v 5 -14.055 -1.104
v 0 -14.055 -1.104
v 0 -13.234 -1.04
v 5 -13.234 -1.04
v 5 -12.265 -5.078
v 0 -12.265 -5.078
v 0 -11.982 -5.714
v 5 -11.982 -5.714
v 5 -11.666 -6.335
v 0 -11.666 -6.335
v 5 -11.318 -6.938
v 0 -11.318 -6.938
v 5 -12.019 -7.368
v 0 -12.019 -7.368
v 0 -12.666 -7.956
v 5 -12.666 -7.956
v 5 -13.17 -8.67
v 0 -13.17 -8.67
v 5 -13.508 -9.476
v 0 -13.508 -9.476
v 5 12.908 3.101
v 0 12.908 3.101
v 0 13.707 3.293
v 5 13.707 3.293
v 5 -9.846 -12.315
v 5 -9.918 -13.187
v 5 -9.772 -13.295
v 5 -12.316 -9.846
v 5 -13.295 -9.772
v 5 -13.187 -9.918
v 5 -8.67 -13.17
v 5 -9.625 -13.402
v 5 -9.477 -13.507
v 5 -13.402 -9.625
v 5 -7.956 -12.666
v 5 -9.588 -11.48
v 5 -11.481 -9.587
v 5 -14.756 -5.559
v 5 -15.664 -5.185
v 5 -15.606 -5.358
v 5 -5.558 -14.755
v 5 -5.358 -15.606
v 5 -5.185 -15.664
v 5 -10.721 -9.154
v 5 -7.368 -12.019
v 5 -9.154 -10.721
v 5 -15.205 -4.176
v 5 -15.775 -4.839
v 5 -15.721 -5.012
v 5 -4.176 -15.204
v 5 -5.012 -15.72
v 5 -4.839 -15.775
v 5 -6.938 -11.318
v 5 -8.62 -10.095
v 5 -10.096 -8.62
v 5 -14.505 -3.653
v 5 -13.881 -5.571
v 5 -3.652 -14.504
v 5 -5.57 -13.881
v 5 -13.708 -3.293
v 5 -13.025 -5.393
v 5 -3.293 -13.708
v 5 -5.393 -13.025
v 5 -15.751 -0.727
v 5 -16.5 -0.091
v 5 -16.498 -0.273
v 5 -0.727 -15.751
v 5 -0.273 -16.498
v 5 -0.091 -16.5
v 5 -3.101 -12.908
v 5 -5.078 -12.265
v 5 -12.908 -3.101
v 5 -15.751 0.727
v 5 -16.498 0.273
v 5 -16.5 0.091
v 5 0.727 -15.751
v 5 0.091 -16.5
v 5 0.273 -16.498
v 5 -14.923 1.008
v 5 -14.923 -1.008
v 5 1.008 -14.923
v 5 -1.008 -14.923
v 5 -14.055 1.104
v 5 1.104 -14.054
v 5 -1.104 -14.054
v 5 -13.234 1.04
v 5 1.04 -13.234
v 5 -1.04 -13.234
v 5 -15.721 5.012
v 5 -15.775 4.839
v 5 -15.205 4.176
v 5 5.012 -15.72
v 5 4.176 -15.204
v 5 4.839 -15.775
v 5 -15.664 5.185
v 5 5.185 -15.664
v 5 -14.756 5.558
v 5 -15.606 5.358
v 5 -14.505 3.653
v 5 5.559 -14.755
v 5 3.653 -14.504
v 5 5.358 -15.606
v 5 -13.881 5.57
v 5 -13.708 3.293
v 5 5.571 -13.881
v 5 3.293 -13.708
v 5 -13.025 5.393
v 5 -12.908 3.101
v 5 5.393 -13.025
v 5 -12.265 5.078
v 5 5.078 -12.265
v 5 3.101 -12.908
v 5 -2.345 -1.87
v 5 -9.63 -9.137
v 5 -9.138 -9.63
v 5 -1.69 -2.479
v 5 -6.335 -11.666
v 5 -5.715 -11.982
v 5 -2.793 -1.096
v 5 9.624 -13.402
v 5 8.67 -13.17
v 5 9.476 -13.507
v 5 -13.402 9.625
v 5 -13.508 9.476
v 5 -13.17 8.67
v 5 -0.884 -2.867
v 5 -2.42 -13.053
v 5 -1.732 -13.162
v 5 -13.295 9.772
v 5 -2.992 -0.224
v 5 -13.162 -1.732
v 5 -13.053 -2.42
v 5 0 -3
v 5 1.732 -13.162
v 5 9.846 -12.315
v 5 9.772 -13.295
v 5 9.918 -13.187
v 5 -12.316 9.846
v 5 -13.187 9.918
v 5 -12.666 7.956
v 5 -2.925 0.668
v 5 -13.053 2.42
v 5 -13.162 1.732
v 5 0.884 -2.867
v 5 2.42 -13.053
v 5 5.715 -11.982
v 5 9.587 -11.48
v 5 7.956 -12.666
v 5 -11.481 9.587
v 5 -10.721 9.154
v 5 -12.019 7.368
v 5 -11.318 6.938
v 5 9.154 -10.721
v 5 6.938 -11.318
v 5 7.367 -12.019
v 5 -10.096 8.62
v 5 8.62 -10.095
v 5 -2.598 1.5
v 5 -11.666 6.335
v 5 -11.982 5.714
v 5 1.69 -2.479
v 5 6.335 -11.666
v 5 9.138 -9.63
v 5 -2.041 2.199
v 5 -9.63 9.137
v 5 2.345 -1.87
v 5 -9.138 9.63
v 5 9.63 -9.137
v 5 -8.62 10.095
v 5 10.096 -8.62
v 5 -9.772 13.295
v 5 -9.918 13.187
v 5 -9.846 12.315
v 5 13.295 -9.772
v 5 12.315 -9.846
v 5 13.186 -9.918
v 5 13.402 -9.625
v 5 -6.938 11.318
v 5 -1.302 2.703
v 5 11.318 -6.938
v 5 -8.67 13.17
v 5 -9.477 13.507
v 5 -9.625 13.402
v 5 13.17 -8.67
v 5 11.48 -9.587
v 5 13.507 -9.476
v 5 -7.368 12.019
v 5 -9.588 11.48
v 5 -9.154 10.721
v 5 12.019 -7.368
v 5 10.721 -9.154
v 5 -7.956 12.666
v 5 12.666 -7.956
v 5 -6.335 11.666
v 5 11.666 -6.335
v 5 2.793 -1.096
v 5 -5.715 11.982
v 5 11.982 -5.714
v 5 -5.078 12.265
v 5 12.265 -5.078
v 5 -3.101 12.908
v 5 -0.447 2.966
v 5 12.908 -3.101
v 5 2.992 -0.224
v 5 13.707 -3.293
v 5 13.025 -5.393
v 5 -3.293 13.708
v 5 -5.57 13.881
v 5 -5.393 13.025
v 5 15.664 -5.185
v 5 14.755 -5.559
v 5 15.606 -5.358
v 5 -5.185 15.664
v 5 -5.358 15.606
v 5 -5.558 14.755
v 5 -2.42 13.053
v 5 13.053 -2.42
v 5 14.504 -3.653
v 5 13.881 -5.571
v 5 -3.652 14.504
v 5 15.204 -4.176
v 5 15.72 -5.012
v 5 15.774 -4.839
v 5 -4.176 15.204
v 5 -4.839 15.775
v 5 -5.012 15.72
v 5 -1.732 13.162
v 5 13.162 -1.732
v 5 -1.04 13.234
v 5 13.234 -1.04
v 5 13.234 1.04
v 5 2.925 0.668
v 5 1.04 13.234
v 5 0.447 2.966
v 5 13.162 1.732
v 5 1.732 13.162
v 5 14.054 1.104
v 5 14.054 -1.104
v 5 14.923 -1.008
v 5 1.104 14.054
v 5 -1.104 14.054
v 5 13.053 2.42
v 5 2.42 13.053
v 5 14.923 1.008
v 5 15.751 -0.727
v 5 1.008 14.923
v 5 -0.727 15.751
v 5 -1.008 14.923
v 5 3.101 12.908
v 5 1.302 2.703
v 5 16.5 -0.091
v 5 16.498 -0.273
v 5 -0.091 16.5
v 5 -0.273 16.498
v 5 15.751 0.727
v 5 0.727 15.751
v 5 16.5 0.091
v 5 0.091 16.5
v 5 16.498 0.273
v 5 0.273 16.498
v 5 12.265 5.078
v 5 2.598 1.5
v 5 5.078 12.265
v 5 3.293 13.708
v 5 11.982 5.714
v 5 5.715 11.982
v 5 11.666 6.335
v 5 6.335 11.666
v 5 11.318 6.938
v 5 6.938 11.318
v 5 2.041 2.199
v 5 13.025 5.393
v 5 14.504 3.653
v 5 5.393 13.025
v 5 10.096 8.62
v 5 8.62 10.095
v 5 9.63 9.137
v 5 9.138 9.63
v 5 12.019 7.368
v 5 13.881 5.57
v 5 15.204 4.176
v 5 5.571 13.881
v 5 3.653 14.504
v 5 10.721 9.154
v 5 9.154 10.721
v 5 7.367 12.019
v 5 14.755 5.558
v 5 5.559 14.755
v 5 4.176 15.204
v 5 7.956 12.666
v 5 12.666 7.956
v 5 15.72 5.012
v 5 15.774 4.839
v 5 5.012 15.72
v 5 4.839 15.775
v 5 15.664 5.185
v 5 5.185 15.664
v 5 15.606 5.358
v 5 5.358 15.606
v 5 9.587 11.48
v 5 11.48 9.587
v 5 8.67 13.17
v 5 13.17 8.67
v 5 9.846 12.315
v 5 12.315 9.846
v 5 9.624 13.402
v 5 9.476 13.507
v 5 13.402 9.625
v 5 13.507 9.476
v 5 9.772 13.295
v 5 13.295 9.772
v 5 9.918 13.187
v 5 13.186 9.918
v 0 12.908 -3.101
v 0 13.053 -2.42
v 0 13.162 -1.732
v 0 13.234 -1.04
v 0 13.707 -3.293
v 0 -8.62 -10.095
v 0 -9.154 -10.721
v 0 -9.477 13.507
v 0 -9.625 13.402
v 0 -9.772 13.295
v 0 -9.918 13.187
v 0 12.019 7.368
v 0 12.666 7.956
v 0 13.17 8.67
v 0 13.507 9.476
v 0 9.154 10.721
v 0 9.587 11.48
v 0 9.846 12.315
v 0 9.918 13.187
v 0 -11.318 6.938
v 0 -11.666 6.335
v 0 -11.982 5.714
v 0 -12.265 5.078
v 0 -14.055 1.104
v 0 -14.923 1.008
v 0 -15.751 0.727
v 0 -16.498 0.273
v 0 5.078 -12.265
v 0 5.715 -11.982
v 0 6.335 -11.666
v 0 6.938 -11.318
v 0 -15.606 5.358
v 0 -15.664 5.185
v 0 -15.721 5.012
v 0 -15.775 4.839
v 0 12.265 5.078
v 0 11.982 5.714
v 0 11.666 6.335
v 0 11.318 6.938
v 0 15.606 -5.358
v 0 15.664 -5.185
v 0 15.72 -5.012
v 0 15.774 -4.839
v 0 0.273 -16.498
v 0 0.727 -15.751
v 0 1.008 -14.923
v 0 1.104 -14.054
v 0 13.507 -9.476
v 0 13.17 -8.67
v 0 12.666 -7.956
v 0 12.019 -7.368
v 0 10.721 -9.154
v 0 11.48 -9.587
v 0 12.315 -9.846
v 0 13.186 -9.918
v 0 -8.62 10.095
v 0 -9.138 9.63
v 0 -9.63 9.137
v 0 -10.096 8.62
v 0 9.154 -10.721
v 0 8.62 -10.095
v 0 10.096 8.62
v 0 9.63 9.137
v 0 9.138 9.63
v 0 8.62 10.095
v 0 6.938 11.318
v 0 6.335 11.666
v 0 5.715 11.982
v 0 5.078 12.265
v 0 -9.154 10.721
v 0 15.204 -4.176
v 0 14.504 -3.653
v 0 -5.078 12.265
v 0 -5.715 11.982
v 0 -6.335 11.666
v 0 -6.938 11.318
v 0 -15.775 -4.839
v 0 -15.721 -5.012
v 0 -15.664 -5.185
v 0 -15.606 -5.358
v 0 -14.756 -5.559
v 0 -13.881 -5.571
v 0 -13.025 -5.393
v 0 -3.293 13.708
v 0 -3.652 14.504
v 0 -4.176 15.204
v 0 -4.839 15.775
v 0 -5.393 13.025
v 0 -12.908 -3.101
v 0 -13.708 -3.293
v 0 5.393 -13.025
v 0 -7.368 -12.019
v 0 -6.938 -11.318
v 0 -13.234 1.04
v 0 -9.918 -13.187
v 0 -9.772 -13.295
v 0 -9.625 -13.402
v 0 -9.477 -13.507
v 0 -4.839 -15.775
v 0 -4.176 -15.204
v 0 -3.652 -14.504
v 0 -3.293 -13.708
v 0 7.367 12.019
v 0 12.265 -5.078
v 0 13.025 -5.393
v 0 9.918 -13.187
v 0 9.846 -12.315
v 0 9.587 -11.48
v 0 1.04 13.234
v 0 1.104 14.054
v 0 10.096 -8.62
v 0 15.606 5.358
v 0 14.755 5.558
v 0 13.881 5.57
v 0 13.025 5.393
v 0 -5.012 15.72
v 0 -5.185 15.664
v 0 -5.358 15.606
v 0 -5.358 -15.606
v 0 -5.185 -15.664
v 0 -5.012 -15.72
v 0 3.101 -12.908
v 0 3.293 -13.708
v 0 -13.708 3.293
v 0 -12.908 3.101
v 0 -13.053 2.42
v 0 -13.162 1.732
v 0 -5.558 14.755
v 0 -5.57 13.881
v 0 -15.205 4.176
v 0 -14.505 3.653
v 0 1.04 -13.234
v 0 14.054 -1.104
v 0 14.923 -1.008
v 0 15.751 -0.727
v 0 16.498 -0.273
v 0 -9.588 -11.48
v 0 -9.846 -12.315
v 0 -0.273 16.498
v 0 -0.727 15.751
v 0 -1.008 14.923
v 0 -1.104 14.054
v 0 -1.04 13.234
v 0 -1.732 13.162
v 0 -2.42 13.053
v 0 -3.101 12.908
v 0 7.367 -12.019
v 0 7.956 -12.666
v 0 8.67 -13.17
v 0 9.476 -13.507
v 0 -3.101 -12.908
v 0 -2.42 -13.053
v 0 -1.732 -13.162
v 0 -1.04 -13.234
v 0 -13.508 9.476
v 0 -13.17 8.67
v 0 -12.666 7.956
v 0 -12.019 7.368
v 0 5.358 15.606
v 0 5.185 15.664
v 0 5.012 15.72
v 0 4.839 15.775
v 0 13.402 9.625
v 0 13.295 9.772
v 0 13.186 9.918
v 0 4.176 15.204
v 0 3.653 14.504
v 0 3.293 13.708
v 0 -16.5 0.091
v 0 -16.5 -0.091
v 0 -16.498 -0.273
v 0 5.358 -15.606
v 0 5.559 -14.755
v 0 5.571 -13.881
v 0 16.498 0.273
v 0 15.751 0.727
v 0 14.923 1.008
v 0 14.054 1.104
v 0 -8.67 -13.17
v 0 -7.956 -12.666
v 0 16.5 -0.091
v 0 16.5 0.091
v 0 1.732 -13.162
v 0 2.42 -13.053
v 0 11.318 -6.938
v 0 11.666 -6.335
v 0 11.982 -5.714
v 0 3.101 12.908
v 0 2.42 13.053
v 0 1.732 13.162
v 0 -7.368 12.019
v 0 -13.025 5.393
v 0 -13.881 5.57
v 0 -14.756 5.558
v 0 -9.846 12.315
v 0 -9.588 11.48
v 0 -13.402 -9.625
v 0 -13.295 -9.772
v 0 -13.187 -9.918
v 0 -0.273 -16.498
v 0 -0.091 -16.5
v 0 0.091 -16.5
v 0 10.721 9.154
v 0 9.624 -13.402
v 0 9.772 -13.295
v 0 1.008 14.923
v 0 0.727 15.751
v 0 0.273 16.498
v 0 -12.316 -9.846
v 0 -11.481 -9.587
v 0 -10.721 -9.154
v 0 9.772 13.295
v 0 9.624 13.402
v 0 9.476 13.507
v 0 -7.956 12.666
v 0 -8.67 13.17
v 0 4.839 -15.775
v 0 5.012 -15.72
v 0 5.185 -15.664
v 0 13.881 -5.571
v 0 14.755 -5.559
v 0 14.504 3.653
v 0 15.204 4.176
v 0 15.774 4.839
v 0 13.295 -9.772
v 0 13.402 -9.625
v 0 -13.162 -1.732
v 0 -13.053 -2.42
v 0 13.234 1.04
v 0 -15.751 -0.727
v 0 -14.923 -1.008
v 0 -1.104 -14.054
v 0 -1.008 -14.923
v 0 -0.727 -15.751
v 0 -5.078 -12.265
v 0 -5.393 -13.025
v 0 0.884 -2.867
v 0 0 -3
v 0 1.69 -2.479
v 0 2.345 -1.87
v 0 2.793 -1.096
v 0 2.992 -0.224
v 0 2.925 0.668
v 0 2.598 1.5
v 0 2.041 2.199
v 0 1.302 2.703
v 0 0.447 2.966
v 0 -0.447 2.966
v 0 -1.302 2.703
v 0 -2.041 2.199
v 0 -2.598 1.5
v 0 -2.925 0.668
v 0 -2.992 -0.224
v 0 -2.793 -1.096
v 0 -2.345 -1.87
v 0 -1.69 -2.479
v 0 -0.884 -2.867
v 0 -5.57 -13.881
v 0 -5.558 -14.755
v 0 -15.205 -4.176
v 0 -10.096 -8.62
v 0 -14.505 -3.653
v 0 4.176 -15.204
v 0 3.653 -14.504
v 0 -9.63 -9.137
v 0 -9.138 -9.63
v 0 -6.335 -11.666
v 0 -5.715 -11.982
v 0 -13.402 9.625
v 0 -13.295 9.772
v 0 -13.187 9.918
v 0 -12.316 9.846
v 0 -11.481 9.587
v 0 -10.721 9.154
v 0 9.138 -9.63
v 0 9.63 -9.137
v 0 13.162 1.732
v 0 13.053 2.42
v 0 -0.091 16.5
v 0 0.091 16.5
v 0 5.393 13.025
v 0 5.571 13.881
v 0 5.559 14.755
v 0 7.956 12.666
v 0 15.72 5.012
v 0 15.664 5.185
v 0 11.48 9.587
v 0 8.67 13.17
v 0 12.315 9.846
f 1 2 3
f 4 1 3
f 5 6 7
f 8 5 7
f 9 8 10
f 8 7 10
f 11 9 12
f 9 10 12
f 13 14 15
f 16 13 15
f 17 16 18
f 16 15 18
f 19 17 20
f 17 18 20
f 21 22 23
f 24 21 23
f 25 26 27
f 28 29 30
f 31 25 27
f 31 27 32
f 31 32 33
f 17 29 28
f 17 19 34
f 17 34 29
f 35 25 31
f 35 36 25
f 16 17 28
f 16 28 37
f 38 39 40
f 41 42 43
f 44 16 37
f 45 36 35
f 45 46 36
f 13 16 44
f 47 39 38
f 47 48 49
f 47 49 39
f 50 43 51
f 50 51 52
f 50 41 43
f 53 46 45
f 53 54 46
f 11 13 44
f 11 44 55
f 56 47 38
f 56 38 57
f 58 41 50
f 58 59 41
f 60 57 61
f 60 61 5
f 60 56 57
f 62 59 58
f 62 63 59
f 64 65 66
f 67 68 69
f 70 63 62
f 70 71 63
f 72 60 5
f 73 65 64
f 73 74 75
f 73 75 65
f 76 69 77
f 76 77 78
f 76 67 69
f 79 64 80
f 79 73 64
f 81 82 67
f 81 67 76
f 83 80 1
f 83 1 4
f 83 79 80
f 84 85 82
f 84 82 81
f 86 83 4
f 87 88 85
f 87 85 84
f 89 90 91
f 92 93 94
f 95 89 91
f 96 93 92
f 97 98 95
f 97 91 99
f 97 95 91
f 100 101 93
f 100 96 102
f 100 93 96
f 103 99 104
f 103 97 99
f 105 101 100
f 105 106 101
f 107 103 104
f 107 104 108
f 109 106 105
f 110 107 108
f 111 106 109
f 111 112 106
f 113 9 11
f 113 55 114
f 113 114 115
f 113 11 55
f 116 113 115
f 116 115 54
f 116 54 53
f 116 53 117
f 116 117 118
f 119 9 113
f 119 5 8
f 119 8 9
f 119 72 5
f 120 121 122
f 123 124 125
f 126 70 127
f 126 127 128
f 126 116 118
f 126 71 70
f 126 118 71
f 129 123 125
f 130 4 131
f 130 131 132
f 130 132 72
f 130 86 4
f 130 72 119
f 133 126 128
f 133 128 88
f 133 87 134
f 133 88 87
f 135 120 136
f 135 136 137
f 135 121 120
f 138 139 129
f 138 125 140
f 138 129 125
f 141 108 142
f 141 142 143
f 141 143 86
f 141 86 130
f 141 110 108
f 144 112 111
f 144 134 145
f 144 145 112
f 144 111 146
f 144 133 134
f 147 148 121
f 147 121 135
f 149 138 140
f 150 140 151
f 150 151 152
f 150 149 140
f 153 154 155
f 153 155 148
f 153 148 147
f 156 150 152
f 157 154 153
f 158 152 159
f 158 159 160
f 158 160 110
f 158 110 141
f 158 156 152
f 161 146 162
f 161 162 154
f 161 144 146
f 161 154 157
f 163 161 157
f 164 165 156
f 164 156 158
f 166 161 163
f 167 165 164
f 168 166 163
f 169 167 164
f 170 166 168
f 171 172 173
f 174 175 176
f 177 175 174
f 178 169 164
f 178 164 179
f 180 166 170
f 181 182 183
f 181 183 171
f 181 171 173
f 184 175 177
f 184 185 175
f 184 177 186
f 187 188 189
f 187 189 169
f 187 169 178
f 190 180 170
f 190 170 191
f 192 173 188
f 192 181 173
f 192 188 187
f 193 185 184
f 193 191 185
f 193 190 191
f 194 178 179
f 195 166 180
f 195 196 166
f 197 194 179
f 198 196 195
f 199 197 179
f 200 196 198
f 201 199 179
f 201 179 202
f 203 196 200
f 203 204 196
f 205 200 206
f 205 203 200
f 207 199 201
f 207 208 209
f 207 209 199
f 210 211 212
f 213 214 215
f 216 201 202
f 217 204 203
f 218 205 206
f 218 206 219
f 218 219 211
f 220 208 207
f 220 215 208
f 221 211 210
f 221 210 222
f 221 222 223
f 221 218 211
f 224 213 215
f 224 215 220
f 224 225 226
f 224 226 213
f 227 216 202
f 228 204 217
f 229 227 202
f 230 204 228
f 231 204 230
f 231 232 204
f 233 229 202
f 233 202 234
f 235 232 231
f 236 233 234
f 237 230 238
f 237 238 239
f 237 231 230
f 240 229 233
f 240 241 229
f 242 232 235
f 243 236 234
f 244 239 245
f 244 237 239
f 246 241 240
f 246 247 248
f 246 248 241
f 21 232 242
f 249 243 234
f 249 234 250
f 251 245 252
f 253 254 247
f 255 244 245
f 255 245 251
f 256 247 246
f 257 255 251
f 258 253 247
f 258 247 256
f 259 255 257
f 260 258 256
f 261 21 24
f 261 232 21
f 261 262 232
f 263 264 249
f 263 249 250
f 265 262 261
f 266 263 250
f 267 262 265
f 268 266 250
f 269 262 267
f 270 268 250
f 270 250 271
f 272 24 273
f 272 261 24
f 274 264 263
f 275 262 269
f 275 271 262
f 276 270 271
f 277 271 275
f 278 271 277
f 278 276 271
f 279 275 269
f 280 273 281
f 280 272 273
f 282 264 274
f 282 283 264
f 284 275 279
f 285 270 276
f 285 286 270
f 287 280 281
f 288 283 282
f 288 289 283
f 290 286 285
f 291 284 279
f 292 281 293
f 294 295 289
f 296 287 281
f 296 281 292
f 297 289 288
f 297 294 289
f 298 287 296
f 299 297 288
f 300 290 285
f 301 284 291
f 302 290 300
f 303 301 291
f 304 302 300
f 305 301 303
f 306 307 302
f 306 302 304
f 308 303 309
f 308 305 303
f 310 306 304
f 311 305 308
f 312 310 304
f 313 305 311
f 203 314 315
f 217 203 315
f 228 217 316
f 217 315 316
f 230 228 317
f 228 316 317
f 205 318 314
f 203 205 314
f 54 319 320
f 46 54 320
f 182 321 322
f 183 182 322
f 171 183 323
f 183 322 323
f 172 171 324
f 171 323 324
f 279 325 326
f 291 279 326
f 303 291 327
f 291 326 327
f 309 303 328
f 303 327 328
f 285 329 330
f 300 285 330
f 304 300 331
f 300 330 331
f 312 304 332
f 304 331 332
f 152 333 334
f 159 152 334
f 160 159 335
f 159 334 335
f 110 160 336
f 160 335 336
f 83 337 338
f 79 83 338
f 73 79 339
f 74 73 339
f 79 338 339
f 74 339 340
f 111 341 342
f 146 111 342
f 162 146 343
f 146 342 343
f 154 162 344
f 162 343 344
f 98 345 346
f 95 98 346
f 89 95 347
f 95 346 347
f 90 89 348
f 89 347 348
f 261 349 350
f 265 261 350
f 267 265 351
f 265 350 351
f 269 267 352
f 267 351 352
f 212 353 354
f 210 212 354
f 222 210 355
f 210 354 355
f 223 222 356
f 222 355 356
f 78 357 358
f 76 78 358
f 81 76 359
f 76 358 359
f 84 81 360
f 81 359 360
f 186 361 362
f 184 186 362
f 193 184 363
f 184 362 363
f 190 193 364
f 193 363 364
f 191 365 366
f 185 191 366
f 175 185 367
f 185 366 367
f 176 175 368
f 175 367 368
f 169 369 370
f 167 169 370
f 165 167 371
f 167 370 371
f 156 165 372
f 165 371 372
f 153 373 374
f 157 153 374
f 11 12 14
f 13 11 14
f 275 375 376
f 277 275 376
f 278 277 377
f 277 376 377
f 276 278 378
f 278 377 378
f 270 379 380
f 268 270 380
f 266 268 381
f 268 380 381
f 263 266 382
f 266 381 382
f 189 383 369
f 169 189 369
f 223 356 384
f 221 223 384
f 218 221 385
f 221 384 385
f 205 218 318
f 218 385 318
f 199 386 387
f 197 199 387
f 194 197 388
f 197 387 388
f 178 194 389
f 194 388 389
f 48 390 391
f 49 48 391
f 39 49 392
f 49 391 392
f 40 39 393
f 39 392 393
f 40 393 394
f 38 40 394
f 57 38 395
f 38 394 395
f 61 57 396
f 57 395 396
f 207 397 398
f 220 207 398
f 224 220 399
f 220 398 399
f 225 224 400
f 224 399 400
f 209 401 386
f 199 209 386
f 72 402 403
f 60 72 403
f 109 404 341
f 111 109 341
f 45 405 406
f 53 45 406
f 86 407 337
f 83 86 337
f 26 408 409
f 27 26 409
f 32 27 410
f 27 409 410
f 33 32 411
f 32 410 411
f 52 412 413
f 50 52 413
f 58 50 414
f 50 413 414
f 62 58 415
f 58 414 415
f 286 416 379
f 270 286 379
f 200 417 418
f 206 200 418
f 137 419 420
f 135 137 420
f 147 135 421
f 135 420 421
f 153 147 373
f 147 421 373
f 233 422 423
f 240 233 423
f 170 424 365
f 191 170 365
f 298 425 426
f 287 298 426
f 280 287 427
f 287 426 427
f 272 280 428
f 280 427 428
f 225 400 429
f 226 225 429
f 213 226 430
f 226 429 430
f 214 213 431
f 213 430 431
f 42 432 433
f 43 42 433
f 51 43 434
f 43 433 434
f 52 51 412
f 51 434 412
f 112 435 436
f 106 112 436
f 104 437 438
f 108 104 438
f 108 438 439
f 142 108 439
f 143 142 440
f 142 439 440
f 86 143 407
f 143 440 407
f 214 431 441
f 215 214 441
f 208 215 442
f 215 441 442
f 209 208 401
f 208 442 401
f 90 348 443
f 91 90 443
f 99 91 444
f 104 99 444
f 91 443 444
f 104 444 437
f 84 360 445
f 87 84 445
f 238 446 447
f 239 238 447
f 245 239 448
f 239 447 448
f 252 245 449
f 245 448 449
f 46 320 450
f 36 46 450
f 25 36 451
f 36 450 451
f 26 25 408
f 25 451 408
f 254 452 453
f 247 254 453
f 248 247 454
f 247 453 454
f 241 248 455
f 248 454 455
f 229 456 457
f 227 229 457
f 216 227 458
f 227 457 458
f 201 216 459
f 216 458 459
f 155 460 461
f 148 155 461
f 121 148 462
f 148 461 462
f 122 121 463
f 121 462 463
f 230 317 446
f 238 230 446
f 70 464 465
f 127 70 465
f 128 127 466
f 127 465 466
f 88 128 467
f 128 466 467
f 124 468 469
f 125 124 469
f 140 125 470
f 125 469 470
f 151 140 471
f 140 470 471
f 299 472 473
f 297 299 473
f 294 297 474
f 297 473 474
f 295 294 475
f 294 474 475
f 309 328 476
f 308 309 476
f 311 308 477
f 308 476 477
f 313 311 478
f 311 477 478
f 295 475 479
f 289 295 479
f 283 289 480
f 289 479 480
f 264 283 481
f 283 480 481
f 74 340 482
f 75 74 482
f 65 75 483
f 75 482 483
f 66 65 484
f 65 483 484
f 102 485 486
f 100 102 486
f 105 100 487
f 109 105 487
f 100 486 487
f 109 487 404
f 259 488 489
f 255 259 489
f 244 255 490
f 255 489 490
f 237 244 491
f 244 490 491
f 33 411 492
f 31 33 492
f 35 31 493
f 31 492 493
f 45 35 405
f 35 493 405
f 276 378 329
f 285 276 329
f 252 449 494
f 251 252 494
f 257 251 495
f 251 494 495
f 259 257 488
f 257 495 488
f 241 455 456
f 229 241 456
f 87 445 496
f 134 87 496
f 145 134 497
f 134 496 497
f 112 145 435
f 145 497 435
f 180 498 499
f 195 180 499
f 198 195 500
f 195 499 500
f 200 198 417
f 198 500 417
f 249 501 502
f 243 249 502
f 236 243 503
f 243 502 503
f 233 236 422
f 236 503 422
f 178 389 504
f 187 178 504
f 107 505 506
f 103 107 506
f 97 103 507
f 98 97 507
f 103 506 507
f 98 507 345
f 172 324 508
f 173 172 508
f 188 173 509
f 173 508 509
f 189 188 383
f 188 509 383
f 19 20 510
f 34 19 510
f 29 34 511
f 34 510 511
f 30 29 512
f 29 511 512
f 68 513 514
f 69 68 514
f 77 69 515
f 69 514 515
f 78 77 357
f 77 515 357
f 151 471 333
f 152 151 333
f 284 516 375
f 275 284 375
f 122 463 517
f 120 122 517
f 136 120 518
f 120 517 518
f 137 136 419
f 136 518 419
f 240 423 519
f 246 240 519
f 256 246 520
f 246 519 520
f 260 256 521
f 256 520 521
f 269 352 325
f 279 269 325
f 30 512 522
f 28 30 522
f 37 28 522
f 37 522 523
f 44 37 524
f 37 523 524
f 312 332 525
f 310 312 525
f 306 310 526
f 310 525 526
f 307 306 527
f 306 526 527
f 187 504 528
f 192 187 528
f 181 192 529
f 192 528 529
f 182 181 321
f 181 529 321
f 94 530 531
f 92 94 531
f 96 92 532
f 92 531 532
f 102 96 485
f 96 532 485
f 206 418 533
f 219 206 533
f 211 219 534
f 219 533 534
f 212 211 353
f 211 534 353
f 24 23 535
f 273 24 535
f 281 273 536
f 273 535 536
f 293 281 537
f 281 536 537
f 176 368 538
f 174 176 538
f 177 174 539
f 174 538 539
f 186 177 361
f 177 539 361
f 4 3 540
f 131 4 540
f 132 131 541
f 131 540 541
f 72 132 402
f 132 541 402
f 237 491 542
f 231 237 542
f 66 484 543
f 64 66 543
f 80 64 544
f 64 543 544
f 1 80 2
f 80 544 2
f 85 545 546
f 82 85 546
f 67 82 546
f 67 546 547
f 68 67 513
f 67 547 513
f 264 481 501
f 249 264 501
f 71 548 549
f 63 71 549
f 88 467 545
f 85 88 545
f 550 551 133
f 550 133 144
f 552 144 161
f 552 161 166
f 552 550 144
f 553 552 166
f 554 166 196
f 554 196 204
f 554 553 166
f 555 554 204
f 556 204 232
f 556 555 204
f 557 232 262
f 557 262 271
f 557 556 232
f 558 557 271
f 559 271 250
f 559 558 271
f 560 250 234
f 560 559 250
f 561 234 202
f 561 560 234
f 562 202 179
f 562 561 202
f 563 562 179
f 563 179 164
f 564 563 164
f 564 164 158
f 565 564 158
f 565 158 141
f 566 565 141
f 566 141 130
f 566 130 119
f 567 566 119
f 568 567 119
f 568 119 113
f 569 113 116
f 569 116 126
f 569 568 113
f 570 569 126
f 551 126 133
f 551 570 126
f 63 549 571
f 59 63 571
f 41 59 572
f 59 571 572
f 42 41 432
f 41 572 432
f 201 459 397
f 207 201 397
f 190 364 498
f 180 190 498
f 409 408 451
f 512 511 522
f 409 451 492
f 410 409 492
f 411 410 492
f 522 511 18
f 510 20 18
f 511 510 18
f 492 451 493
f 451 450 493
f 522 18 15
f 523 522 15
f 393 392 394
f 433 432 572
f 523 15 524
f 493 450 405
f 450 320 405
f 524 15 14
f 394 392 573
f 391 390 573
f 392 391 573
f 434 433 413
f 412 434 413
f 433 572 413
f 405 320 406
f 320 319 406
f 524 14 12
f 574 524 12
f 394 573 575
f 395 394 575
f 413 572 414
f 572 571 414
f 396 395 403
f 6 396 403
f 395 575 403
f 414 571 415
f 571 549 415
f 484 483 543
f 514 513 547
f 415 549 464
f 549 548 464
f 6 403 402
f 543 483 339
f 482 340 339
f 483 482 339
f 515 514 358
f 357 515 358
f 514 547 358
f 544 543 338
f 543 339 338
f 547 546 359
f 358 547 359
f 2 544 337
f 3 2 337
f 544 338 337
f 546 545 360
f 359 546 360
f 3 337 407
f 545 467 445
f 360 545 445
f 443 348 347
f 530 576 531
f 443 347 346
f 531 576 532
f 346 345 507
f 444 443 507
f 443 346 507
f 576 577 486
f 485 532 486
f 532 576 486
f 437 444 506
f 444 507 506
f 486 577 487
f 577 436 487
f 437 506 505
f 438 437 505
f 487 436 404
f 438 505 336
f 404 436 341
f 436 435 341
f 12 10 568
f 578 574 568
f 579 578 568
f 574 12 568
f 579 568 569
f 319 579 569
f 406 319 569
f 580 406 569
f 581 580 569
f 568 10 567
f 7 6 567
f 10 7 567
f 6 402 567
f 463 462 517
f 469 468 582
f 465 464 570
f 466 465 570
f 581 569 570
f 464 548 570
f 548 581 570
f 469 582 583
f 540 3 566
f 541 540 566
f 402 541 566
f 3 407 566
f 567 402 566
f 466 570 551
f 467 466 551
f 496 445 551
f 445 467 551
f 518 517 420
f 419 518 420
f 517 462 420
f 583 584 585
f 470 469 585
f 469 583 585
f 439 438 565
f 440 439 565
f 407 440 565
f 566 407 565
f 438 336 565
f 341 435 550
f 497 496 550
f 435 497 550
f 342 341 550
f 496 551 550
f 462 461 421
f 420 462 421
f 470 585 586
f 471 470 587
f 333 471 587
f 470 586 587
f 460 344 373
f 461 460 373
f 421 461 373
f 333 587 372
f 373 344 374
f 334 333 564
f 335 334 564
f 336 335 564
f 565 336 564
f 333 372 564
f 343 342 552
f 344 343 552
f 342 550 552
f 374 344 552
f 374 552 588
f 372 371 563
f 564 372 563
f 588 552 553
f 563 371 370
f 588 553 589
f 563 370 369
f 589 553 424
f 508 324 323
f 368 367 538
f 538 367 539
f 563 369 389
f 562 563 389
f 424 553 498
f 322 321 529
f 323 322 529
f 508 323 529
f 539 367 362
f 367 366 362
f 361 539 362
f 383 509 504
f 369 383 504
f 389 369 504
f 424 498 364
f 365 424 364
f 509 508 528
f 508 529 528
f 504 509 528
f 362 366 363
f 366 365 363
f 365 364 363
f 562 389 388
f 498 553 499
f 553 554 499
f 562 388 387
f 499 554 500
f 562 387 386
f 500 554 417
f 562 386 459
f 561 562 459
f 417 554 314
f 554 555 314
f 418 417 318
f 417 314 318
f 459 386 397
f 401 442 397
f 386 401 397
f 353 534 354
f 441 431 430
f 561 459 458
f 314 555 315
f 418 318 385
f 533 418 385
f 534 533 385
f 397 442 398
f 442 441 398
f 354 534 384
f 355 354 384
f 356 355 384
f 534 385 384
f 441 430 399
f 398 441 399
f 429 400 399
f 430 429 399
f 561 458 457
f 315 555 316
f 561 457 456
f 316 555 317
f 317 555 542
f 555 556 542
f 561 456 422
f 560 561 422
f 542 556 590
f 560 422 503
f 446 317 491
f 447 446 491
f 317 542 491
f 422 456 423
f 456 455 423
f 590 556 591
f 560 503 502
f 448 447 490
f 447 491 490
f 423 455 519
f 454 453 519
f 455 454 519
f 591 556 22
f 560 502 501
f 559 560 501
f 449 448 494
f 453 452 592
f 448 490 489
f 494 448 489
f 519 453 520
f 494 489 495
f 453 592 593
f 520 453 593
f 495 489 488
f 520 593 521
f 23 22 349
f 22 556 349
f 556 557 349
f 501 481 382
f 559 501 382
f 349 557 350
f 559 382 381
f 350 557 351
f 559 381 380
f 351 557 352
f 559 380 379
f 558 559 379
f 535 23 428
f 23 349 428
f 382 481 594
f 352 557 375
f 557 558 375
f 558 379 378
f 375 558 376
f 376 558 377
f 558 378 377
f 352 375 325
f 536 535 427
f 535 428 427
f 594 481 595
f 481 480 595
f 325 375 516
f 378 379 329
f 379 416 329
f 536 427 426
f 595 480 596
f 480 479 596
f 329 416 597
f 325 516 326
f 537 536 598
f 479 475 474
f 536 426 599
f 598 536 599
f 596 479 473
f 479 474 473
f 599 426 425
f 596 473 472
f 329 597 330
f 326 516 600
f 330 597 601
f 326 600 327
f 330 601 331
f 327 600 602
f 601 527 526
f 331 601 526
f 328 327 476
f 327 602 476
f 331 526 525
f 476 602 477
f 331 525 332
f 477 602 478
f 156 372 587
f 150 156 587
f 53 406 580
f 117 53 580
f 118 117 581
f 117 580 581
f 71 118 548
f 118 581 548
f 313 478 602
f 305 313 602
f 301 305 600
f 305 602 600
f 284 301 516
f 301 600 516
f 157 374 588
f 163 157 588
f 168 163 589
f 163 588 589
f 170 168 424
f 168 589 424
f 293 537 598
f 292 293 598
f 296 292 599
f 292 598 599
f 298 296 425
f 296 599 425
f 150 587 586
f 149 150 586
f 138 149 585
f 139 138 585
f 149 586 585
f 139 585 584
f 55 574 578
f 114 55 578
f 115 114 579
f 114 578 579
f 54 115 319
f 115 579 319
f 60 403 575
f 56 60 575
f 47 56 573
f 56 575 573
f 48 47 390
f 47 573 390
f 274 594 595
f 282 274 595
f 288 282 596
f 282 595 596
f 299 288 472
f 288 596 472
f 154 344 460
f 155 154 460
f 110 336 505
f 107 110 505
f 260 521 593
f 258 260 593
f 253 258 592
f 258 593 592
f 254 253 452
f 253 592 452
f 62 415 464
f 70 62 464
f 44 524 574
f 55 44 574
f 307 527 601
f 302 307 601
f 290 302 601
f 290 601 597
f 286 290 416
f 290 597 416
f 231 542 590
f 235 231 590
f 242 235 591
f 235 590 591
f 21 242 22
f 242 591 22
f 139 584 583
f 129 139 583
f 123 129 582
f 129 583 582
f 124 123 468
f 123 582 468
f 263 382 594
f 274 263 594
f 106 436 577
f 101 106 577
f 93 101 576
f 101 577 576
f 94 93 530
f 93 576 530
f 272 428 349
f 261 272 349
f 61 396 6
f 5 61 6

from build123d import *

# Parameters (mm, degrees)
MODEL_R             = 3
BOSS_EXTRUDE3_DEPTH = 5


with BuildPart() as part:
    # Model → Boss-Extrude3 (new body)
    with BuildSketch(Plane.YZ):
        with BuildLine():
            Line((13.23422421, -1.039678776), (14.054007268, -1.104122279))
            ThreePointArc((14.054007268, -1.104122279), (15.344427311, -0.890154011), (16.497633121, -0.272835077))
            ThreePointArc((16.497633121, -0.272835077), (16.499889045, 0), (16.497633121, 0.272835077))
            ThreePointArc((16.497633121, 0.272835077), (15.34442594, 0.890147785), (14.054007268, 1.104113746))
            Line((14.054007268, 1.104113746), (13.23422421, 1.039678776))
            ThreePointArc((13.23422421, 1.039678776), (13.111569145, 2.076626337), (12.907793057, 3.100725851))
            Line((12.907793057, 3.100725851), (13.707329207, 3.292922702))
            ThreePointArc((13.707329207, 3.292922702), (14.868425654, 3.895152548), (15.774406226, 4.838563885))
            ThreePointArc((15.774406226, 4.838563885), (15.692222832, 5.098794143), (15.60574669, 5.357629562))
            ThreePointArc((15.60574669, 5.357629562), (14.318274111, 5.588337046), (13.024951323, 5.393073752))
            Line((13.024951323, 5.393073752), (12.265239884, 5.078337619))
            ThreePointArc((12.265239884, 5.078337619), (11.828111536, 6.02672381), (11.317788592, 6.937815491))
            Line((11.317788592, 6.937815491), (12.018874896, 7.367617174))
            ThreePointArc((12.018874896, 7.367617174), (12.937059572, 8.29919163), (13.507168648, 9.476421305))
            ThreePointArc((13.507168648, 9.476421305), (13.348651089, 9.698493941), (13.186482736, 9.917914762))
            ThreePointArc((13.186482736, 9.917914762), (11.890651127, 9.739508353), (10.72089422, 9.154121999))
            Line((10.72089422, 9.154121999), (10.095695669, 8.619892769))
            ThreePointArc((10.095695669, 8.619892769), (9.386972883, 9.386712017), (8.620173331, 10.095456114))
            Line((8.620173331, 10.095456114), (9.153880493, 10.721137246))
            ThreePointArc((9.153880493, 10.721137246), (9.739259724, 11.890873647), (9.917672889, 13.186682597))
            ThreePointArc((9.917672889, 13.186682597), (9.698234401, 13.348871345), (9.476143545, 13.507408695))
            ThreePointArc((9.476143545, 13.507408695), (8.298924763, 12.937292239), (7.367360076, 12.019107034))
            Line((7.367360076, 12.019107034), (6.937941159, 11.317711556))
            ThreePointArc((6.937941159, 11.317711556), (6.026818359, 11.828063361), (5.078397518, 12.265215084))
            Line((5.078397518, 12.265215084), (5.393131966, 13.025188132))
            ThreePointArc((5.393131966, 13.025188132), (5.588395055, 14.318515258), (5.357684148, 15.605991551))
            ThreePointArc((5.357684148, 15.605991551), (5.098848094, 15.692468837), (4.838617177, 15.774653351))
            ThreePointArc((4.838617177, 15.774653351), (3.895206219, 14.868670943), (3.292977313, 13.707572882))
            Line((3.292977313, 13.707572882), (3.100760275, 12.907784787))
            ThreePointArc((3.100760275, 12.907784787), (2.076645901, 13.111566047), (1.039682977, 13.23422388))
            Line((1.039682977, 13.23422388), (1.104104268, 14.054249317))
            ThreePointArc((1.104104268, 14.054249317), (0.890123262, 15.344688358), (0.272780986, 16.497905294))
            ThreePointArc((0.272780986, 16.497905294), (0, 16.500160321), (-0.272780986, 16.497905294))
            ThreePointArc((-0.272780986, 16.497905294), (-0.890123262, 15.344688358), (-1.104104268, 14.054249317))
            Line((-1.104104268, 14.054249317), (-1.039682977, 13.23422388))
            ThreePointArc((-1.039682977, 13.23422388), (-2.076645901, 13.111566047), (-3.100760275, 12.907784787))
            Line((-3.100760275, 12.907784787), (-3.292901189, 13.707572882))
            ThreePointArc((-3.292901189, 13.707572882), (-3.895130728, 14.8686712), (-4.838542654, 15.774653351))
            ThreePointArc((-4.838542654, 15.774653351), (-5.09877719, 15.692468897), (-5.357616845, 15.605991551))
            ThreePointArc((-5.357616845, 15.605991551), (-5.588327412, 14.318515249), (-5.393064608, 13.025188132))
            Line((-5.393064608, 13.025188132), (-5.078397518, 12.265215084))
            ThreePointArc((-5.078397518, 12.265215084), (-6.026818359, 11.828063361), (-6.937941159, 11.317711556))
            Line((-6.937941159, 11.317711556), (-7.367917741, 12.019107034))
            ThreePointArc((-7.367917741, 12.019107034), (-8.299522933, 12.93730687), (-9.476792265, 13.507408695))
            ThreePointArc((-9.476792265, 13.507408695), (-9.69882033, 13.348870312), (-9.918196776, 13.186682597))
            ThreePointArc((-9.918196776, 13.186682597), (-9.739783579, 11.890873626), (-9.154404251, 10.721137246))
            Line((-9.154404251, 10.721137246), (-8.620173331, 10.095456114))
            ThreePointArc((-8.620173331, 10.095456114), (-9.386972883, 9.386712017), (-10.095695669, 8.619892769))
            Line((-10.095695669, 8.619892769), (-10.721421894, 9.154121999))
            ThreePointArc((-10.721421894, 9.154121999), (-11.891119242, 9.739488239), (-13.18688523, 9.917914762))
            ThreePointArc((-13.18688523, 9.917914762), (-13.349106741, 9.698494383), (-13.507677449, 9.476421305))
            ThreePointArc((-13.507677449, 9.476421305), (-12.937567793, 8.29919139), (-12.019382207, 7.367617174))
            Line((-12.019382207, 7.367617174), (-11.317788592, 6.937815491))
            ThreePointArc((-11.317788592, 6.937815491), (-11.828111536, 6.02672381), (-12.265239884, 5.078337619))
            Line((-12.265239884, 5.078337619), (-13.025469237, 5.393073752))
            ThreePointArc((-13.025469237, 5.393073752), (-14.318795833, 5.588338267), (-15.606272205, 5.357629562))
            ThreePointArc((-15.606272205, 5.357629562), (-15.692748124, 5.098794139), (-15.774931305, 4.838563885))
            ThreePointArc((-15.774931305, 4.838563885), (-14.868950755, 3.895152556), (-13.707854335, 3.292922702))
            Line((-13.707854335, 3.292922702), (-12.907793057, 3.100725851))
            ThreePointArc((-12.907793057, 3.100725851), (-13.111569145, 2.076626337), (-13.23422421, 1.039678776))
            Line((-13.23422421, 1.039678776), (-14.05453238, 1.104113746))
            ThreePointArc((-14.05453238, 1.104113746), (-15.344937836, 0.890143752), (-16.498133136, 0.272835077))
            ThreePointArc((-16.498133136, 0.272835077), (-16.500389058, 0), (-16.498133136, -0.272835077))
            ThreePointArc((-16.498133136, -0.272835077), (-15.344939207, -0.890149979), (-14.05453238, -1.104122279))
            Line((-14.05453238, -1.104122279), (-13.23422421, -1.039678776))
            ThreePointArc((-13.23422421, -1.039678776), (-13.111569145, -2.076626337), (-12.907793057, -3.100725851))
            Line((-12.907793057, -3.100725851), (-13.707854335, -3.292963653))
            ThreePointArc((-13.707854335, -3.292963653), (-14.868950761, -3.895193523), (-15.774931305, -4.838604875))
            ThreePointArc((-15.774931305, -4.838604875), (-15.692748091, -5.098833138), (-15.606272205, -5.35766658))
            ThreePointArc((-15.606272205, -5.35766658), (-14.318795843, -5.588375668), (-13.025469237, -5.393110833))
            Line((-13.025469237, -5.393110833), (-12.265239884, -5.078337619))
            ThreePointArc((-12.265239884, -5.078337619), (-11.828111536, -6.02672381), (-11.317788592, -6.937815491))
            Line((-11.317788592, -6.937815491), (-12.019382207, -7.367660494))
            ThreePointArc((-12.019382207, -7.367660494), (-12.937567956, -8.299235159), (-13.507677449, -9.476465634))
            ThreePointArc((-13.507677449, -9.476465634), (-13.34910671, -9.698536821), (-13.18688523, -9.917955332))
            ThreePointArc((-13.18688523, -9.917955332), (-11.891119181, -9.739528715), (-10.721421894, -9.154162191))
            Line((-10.721421894, -9.154162191), (-10.095695669, -8.619892769))
            ThreePointArc((-10.095695669, -8.619892769), (-9.386972883, -9.386712017), (-8.620173331, -10.095456114))
            Line((-8.620173331, -10.095456114), (-9.154404251, -10.721178465))
            ThreePointArc((-9.154404251, -10.721178465), (-9.739783866, -11.890915694), (-9.918196776, -13.186725599))
            ThreePointArc((-9.918196776, -13.186725599), (-9.698820328, -13.348913221), (-9.476792265, -13.507451513))
            ThreePointArc((-9.476792265, -13.507451513), (-8.299522952, -12.937349732), (-7.367917741, -12.019149967))
            Line((-7.367917741, -12.019149967), (-6.937941159, -11.317711556))
            ThreePointArc((-6.937941159, -11.317711556), (-6.026818359, -11.828063361), (-5.078397518, -12.265215084))
            Line((-5.078397518, -12.265215084), (-5.393064608, -13.025228542))
            ThreePointArc((-5.393064608, -13.025228542), (-5.588327412, -14.31855566), (-5.357616845, -15.606031962))
            ThreePointArc((-5.357616845, -15.606031962), (-5.098777189, -15.692509269), (-4.838542654, -15.774693688))
            ThreePointArc((-4.838542654, -15.774693688), (-3.895130728, -14.868711537), (-3.292901189, -13.707613219))
            Line((-3.292901189, -13.707613219), (-3.100760275, -12.907784787))
            ThreePointArc((-3.100760275, -12.907784787), (-2.076645901, -13.111566047), (-1.039682977, -13.23422388))
            Line((-1.039682977, -13.23422388), (-1.104104268, -14.054290311))
            ThreePointArc((-1.104104268, -14.054290311), (-0.890123262, -15.344729352), (-0.272780986, -16.497946289))
            ThreePointArc((-0.272780986, -16.497946289), (0, -16.500201314), (0.272780986, -16.497946289))
            ThreePointArc((0.272780986, -16.497946289), (0.890123262, -15.344729352), (1.104104268, -14.054290311))
            Line((1.104104268, -14.054290311), (1.039682977, -13.23422388))
            ThreePointArc((1.039682977, -13.23422388), (2.076645901, -13.111566047), (3.100760275, -12.907784787))
            Line((3.100760275, -12.907784787), (3.292977313, -13.707613219))
            ThreePointArc((3.292977313, -13.707613219), (3.895206219, -14.868711279), (4.838617177, -15.774693688))
            ThreePointArc((4.838617177, -15.774693688), (5.098848093, -15.69250921), (5.357684148, -15.606031962))
            ThreePointArc((5.357684148, -15.606031962), (5.588395055, -14.318555669), (5.393131966, -13.025228542))
            Line((5.393131966, -13.025228542), (5.078397518, -12.265215084))
            ThreePointArc((5.078397518, -12.265215084), (6.026818359, -11.828063361), (6.937941159, -11.317711556))
            Line((6.937941159, -11.317711556), (7.367360076, -12.019149967))
            ThreePointArc((7.367360076, -12.019149967), (8.298924781, -12.937335102), (9.476143545, -13.507451513))
            ThreePointArc((9.476143545, -13.507451513), (9.698234399, -13.348914253), (9.917672889, -13.186725599))
            ThreePointArc((9.917672889, -13.186725599), (9.73926001, -11.890915714), (9.153880493, -10.721178465))
            Line((9.153880493, -10.721178465), (8.620173331, -10.095456114))
            ThreePointArc((8.620173331, -10.095456114), (9.386972883, -9.386712017), (10.095695669, -8.619892769))
            Line((10.095695669, -8.619892769), (10.72089422, -9.154162191))
            ThreePointArc((10.72089422, -9.154162191), (11.890651066, -9.739548829), (13.186482736, -9.917955332))
            ThreePointArc((13.186482736, -9.917955332), (13.348651058, -9.698536379), (13.507168648, -9.476465634))
            ThreePointArc((13.507168648, -9.476465634), (12.937059735, -8.299235399), (12.018874896, -7.367660494))
            Line((12.018874896, -7.367660494), (11.317788592, -6.937815491))
            ThreePointArc((11.317788592, -6.937815491), (11.828111536, -6.02672381), (12.265239884, -5.078337619))
            Line((12.265239884, -5.078337619), (13.024951323, -5.393110833))
            ThreePointArc((13.024951323, -5.393110833), (14.318274121, -5.588374447), (15.60574669, -5.35766658))
            ThreePointArc((15.60574669, -5.35766658), (15.692222799, -5.098833142), (15.774406226, -4.838604875))
            ThreePointArc((15.774406226, -4.838604875), (14.86842566, -3.895193515), (13.707329207, -3.292963653))
            Line((13.707329207, -3.292963653), (12.907793057, -3.100725851))
            ThreePointArc((12.907793057, -3.100725851), (13.111569145, -2.076626337), (13.23422421, -1.039678776))
        make_face()
        with Locations(Location((0, 0, 0), (0, 0, 270))):
            Circle(MODEL_R, mode=Mode.SUBTRACT)
    extrude(amount=BOSS_EXTRUDE3_DEPTH)


solid = part.part
